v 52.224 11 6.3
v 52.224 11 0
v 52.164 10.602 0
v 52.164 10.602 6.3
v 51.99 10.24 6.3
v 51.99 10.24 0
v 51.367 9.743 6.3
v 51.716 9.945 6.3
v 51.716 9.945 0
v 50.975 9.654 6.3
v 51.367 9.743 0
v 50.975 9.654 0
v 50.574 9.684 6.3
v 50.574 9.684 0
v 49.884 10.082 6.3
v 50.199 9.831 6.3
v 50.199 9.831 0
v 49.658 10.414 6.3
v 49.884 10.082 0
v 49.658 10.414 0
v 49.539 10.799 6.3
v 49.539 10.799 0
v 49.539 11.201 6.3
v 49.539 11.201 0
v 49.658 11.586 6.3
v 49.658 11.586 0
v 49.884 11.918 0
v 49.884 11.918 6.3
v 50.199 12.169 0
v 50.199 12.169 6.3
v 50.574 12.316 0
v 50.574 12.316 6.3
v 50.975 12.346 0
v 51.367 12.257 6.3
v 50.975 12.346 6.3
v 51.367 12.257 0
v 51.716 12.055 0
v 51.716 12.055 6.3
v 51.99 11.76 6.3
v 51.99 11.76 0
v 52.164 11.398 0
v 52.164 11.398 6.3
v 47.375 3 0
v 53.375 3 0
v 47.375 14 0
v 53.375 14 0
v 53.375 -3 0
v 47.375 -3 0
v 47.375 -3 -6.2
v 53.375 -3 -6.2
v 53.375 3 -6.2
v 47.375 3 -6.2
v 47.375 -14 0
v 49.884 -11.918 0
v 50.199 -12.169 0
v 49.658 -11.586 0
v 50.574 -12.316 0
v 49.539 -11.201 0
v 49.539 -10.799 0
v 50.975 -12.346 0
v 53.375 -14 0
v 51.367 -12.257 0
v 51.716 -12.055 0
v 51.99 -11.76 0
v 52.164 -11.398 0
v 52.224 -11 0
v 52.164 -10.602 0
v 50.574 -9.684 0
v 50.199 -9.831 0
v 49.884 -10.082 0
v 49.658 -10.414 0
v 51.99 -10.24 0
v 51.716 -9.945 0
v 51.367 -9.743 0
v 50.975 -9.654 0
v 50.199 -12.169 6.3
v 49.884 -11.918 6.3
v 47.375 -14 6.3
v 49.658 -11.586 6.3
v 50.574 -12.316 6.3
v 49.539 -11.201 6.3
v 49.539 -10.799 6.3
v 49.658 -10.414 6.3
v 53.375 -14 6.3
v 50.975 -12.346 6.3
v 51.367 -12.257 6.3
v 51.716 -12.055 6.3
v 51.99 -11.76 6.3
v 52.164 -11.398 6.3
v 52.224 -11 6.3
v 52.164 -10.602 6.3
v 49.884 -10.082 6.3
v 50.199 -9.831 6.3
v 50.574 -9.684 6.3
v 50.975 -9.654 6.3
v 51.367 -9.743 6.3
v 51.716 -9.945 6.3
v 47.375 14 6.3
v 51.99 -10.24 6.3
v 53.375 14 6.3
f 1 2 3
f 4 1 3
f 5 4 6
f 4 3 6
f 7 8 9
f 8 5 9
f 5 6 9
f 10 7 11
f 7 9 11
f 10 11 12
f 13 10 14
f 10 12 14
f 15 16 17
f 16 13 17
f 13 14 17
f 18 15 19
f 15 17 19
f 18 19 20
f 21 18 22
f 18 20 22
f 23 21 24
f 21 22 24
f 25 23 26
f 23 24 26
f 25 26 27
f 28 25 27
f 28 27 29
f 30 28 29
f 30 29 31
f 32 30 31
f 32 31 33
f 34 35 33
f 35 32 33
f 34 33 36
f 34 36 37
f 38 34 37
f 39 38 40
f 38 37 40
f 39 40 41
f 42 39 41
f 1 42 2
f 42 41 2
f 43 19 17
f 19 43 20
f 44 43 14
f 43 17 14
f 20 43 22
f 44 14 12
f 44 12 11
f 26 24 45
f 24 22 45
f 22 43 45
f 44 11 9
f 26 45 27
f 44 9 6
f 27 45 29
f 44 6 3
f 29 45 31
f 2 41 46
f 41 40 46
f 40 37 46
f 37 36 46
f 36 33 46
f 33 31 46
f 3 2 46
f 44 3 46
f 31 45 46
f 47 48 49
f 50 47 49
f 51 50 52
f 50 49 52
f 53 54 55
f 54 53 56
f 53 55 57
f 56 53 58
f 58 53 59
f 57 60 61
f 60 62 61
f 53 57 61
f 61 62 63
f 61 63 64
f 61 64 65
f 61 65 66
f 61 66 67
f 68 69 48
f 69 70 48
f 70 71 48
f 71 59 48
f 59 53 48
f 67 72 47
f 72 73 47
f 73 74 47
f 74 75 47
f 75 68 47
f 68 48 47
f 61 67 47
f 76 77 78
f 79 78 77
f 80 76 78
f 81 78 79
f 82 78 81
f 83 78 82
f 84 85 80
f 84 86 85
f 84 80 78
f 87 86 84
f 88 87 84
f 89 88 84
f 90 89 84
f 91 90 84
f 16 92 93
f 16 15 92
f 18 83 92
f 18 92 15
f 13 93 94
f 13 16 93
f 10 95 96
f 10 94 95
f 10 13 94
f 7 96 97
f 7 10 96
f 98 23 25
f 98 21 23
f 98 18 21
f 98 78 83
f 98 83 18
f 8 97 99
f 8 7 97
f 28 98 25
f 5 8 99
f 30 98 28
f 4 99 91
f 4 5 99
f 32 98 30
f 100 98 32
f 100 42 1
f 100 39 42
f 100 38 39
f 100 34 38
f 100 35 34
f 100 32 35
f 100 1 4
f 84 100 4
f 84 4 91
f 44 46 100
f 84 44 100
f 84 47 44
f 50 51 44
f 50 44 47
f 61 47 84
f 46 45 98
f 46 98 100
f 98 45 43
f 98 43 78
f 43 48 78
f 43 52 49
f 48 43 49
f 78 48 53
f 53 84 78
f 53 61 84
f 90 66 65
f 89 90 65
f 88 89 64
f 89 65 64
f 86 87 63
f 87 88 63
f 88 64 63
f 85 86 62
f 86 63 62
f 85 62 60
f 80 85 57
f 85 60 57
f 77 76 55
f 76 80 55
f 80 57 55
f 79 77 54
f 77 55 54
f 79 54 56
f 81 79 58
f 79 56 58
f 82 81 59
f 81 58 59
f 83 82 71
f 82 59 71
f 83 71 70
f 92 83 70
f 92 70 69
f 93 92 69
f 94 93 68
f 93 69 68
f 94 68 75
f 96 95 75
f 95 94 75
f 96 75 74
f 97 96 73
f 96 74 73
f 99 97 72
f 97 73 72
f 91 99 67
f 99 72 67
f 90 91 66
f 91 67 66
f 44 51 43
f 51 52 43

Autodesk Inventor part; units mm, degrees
ref_plane "YZ Plane" through (0, 0, 0) normal (1, 0, 0) x (0, 1, 0)
ref_plane "XZ Plane" through (0, 0, 0) normal (0, 1, 0) x (-1, 0, 0)
ref_plane "XY Plane" through (0, 0, 0) normal (0, 0, 1) x (1, 0, 0)
sketch "스케치1" plane through (0, 0, 0) normal (0, 0, 1) x (1, 0, 0)
  line L0 (-22.85, 14) -> (53.375, 14) projected
  arc A0 (-22.85, 14) -> (-34.1366, 8.2833) centre (-22.85, 0) ccw projected
  arc A1 (-34.1366, 8.2833) -> (-32.5242, 5.1) centre (-32.5242, 7.1) ccw projected
  line L1 (-22.85, 5.1) -> (-32.5242, 5.1) projected
  arc A2 (-22.85, -5.1) -> (-22.85, 5.1) centre (-22.85, 0) ccw projected
  line L2 (-32.5242, -5.1) -> (-22.85, -5.1) projected
  arc A3 (-32.5242, -5.1) -> (-34.1366, -8.2833) centre (-32.5242, -7.1) ccw projected
  arc A4 (-34.1366, -8.2833) -> (-22.85, -14) centre (-22.85, 0) ccw projected
  line L3 (53.375, -14) -> (-22.85, -14) projected
  line L4 (53.375, 14) -> (53.375, -14) projected
  circle A5 centre (-15.0718, 7.7782) radius 1.025 projected
  circle A6 centre (-15.0718, -7.7782) radius 1.025 projected
  circle A7 centre (-22.85, -11) radius 1.025 projected
  circle A8 centre (-22.85, 11) radius 1.025 projected
  circle A9 centre (-30.6282, -7.7782) radius 1.025 projected
  circle A10 centre (-11.85, 0) radius 1.025 projected
  circle A11 centre (-30.6282, 7.7782) radius 1.025 projected
  circle A12 centre (50.8741, 11) radius 1.35 projected
  circle A13 centre (50.8741, -11) radius 1.35 projected
  line L5 (53.375, 14) -> (47.375, 14)
  line L6 (47.375, 14) -> (47.375, -14)
  line L7 (47.375, -14) -> (53.375, -14)
  line L8 (53.375, -14) -> (53.375, 14)
  point P0 (0, 0)
  dimension "d0" = 6
extrude "돌출1" add sketch "스케치1" along normal blind 6.3 contours L0 L4 L3 L6
sketch "스케치2" plane through (47.375, -14, 0) normal (-1, 0, 0) x (0, 0, 1)
  line L0 (0, 14) -> (0, 11)
  line L1 (0, 28) -> (0, 0) projected
  line L2 (-6.2, 17.1) -> (-6.2, 28) projected
  line L3 (-6.2, 28) -> (0, 28) projected
  line L4 (-0.2, 17.1) -> (-0.2, 28) projected
  line L5 (0, 11) -> (-6.2, 11)
  line L6 (-6.2, 11) -> (-6.2, 17)
  line L7 (-6.2, 17) -> (0, 17)
  line L8 (0, 17) -> (0, 11)
  line L9 (-0.2, 17.1) -> (-6.2, 17.1) projected
  point P0 (-6, 11)
  point P1 (0, 17.1)
  dimension "d3" = 3
extrude "돌출2" add sketch "스케치2" against normal blind 6 contours L0 L5 L6 L7 L1
properties part number "afsd" material "PMMA 플라스틱"
